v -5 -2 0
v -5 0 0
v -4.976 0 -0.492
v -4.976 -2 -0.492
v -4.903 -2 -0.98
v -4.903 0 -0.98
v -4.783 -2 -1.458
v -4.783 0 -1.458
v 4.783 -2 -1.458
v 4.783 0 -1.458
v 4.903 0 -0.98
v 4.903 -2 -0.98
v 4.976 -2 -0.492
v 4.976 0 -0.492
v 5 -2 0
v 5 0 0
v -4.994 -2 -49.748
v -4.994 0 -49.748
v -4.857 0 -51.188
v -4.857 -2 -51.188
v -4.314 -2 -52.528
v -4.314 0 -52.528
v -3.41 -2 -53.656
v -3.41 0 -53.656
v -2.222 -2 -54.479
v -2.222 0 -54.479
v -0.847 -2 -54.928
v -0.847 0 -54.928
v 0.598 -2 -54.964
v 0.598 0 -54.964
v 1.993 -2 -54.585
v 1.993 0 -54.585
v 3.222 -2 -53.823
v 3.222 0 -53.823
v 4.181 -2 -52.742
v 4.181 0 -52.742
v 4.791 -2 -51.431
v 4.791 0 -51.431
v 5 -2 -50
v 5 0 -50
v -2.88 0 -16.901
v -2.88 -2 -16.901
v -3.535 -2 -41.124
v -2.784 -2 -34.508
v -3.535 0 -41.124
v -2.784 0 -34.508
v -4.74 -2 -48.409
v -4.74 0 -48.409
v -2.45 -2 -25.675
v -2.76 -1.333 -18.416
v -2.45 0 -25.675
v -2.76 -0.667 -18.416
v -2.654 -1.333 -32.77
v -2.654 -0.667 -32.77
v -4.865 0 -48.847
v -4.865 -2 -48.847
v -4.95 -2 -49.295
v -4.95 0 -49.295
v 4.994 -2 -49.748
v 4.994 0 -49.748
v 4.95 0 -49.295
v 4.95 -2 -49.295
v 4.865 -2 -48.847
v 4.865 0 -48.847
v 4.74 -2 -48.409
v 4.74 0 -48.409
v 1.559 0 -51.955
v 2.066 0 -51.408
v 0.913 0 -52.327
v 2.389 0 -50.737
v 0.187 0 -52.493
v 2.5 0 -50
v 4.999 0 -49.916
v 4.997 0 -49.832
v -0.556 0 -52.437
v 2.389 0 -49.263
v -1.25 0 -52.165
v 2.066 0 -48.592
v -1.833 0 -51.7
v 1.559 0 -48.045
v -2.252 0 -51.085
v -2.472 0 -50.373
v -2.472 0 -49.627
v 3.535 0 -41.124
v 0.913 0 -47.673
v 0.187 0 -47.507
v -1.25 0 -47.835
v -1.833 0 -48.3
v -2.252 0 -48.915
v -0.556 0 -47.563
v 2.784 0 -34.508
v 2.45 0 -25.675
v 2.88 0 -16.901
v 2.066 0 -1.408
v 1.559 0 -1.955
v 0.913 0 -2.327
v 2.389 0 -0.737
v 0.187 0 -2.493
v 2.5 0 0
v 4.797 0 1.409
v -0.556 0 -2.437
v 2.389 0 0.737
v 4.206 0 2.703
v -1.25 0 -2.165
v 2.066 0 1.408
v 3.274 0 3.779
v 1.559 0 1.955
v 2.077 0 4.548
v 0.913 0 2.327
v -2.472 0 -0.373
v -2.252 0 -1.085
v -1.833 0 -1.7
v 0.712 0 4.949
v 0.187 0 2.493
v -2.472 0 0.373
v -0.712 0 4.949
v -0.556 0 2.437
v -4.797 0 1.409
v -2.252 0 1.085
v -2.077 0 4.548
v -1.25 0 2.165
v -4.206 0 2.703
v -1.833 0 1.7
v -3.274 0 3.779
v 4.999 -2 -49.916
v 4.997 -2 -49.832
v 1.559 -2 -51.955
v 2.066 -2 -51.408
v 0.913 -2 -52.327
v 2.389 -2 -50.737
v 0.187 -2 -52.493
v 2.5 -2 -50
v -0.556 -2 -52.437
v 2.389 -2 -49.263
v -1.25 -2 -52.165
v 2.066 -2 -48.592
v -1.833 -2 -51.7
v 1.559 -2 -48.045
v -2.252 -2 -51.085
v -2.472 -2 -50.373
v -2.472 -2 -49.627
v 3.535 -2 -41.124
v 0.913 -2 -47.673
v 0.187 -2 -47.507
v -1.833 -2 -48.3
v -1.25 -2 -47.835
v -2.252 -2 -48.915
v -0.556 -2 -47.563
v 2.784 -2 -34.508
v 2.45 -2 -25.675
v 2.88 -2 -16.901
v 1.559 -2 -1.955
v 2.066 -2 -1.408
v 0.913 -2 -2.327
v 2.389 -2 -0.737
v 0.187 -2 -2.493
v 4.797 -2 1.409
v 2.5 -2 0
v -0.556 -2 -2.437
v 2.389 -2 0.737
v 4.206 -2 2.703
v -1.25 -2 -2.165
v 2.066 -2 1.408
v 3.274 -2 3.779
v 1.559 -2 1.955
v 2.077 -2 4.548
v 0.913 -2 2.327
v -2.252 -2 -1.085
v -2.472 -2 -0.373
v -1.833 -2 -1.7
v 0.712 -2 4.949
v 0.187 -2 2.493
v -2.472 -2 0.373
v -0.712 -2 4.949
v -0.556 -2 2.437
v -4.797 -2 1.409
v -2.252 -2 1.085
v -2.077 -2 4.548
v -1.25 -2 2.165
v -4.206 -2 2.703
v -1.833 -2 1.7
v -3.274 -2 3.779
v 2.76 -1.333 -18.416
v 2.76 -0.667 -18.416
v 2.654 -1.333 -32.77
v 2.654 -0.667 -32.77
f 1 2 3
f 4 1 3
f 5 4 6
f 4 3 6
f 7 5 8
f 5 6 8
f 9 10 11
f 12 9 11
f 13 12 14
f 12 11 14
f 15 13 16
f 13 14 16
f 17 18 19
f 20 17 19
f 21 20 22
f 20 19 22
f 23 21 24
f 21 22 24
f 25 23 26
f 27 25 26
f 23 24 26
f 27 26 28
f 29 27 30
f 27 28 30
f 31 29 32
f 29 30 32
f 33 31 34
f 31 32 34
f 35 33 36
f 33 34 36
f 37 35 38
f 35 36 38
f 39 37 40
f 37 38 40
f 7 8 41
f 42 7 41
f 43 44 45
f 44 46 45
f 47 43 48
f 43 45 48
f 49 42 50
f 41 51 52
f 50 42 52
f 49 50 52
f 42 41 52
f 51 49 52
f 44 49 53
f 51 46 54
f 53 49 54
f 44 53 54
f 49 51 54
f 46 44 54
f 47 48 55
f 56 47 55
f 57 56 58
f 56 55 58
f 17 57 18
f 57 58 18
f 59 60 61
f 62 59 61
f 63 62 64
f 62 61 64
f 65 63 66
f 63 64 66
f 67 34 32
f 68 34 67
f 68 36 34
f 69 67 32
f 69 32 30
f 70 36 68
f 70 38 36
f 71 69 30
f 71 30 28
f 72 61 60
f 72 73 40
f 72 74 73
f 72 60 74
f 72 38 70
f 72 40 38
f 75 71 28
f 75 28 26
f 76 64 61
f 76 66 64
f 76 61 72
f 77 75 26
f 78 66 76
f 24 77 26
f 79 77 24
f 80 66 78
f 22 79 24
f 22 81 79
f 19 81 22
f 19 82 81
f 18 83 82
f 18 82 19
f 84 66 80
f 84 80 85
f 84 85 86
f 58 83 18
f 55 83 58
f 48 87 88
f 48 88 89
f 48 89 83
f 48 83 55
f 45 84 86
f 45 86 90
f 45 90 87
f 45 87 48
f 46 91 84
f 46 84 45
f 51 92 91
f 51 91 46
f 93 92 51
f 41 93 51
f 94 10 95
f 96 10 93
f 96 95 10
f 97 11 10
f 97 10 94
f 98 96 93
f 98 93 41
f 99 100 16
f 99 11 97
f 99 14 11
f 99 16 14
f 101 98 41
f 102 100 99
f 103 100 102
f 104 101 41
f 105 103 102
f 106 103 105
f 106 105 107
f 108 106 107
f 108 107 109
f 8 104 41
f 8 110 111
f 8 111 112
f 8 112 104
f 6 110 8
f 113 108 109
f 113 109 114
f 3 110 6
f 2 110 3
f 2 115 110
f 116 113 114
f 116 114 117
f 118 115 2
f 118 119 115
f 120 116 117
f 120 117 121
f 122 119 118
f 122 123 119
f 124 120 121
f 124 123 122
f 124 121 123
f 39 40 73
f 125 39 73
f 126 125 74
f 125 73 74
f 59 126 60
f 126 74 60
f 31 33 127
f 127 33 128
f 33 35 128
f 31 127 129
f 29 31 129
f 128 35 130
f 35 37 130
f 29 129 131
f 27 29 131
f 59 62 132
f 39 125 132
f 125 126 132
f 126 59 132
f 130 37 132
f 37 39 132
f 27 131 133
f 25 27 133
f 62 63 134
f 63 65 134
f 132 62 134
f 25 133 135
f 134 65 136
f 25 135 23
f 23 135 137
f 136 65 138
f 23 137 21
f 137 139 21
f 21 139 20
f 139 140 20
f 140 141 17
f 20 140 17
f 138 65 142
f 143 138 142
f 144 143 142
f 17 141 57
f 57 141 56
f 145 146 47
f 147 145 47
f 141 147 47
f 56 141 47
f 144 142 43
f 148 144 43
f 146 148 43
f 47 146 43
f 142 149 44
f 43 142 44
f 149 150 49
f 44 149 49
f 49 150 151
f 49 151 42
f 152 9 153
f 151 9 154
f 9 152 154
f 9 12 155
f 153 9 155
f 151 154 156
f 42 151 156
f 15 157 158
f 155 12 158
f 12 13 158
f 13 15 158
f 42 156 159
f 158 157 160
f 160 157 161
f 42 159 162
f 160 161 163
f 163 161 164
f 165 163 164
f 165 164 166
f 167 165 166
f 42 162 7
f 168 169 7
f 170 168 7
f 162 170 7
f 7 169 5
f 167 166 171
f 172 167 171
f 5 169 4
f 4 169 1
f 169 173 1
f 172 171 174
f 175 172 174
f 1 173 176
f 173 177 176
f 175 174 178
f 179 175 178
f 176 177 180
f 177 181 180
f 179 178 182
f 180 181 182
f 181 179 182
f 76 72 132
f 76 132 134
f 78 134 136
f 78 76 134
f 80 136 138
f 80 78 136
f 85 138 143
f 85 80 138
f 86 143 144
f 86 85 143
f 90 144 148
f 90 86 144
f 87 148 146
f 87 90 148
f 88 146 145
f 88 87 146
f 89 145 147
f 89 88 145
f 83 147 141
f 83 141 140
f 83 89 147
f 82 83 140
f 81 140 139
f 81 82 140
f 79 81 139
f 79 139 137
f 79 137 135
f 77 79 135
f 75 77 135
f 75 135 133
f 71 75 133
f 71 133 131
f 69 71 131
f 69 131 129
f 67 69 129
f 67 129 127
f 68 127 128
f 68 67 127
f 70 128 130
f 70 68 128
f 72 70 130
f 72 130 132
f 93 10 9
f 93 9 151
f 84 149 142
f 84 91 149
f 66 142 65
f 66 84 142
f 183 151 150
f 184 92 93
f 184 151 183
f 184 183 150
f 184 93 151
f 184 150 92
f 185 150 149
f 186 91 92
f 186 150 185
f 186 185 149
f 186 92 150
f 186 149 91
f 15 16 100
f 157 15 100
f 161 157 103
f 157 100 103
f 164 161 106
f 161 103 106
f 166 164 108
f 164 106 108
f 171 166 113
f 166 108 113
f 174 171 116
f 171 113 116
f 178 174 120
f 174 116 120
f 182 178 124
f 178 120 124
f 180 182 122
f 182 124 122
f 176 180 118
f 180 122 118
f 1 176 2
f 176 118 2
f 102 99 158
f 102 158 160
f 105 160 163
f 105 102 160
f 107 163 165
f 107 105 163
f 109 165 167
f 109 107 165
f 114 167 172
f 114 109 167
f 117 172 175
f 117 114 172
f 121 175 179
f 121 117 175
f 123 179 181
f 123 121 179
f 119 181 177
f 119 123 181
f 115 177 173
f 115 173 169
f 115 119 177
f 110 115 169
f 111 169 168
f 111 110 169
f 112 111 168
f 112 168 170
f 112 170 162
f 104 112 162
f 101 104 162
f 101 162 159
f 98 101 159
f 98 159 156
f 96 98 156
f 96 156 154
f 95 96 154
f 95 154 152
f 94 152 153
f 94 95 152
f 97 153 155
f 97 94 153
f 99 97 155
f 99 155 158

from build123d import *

# Parameters (mm, degrees)
F0_R     = 2.5
F1_DEPTH = 2


with BuildPart() as f1:
    # F0 (on Front) → F1 (new body)
    with BuildSketch(Plane.XZ):
        with BuildLine():
            add(Edge.make_bspline(
                [(5, 0), (4.926064, -0.492134), (4.853598, -0.978139), (4.782619, -1.458273)],
                knots=[0, 0, 0, 0, 1.163643, 1.163643, 1.163643, 1.163643], degree=3))
            ThreePointArc((5, 0), (0, 5), (-5, 0))
            add(Edge.make_bspline(
                [(-5, 0), (-4.926064, -0.492134), (-4.853598, -0.978139), (-4.782619, -1.458273)],
                knots=[0, 0, 0, 0, 1.163643, 1.163643, 1.163643, 1.163643], degree=3))
            ThreePointArc((-4.782619, -1.458273), (0, -5), (4.782619, -1.458273))
        make_face()
        Circle(F0_R, mode=Mode.SUBTRACT)
        with BuildLine():
            ThreePointArc((4.782619, -1.458273), (4.945356, -0.737193), (5, 0))
            add(Edge.make_bspline(
                [(5, 0), (4.926064, -0.492134), (4.853598, -0.978139), (4.782619, -1.458273)],
                knots=[0, 0, 0, 0, 1.163643, 1.163643, 1.163643, 1.163643], degree=3))
        make_face()
        with BuildLine():
            add(Edge.make_bspline(
                [(-5, 0), (-4.926064, -0.492134), (-4.853598, -0.978139), (-4.782619, -1.458273)],
                knots=[0, 0, 0, 0, 1.163643, 1.163643, 1.163643, 1.163643], degree=3))
            ThreePointArc((-5, 0), (-4.945356, -0.737193), (-4.782619, -1.458273))
        make_face()
        with BuildLine():
            add(Edge.make_bspline(
                [(4.782619, -1.458273), (1.891675, -21.013817), (1.467811, -30.83033), (4.740109, -48.408974)],
                knots=[1.163643, 1.163643, 1.163643, 1.163643, 48.558084, 48.558084, 48.558084, 48.558084], degree=3))
            ThreePointArc((4.782619, -1.458273), (0, -5), (-4.782619, -1.458273))
            add(Edge.make_bspline(
                [(-4.782619, -1.458273), (-1.891675, -21.013817), (-1.467811, -30.83033), (-4.740109, -48.408974)],
                knots=[1.163643, 1.163643, 1.163643, 1.163643, 48.558084, 48.558084, 48.558084, 48.558084], degree=3))
            ThreePointArc((-4.740109, -48.408974), (0, -45), (4.740109, -48.408974))
        make_face()
        with BuildLine():
            add(Edge.make_bspline(
                [(4.740109, -48.408974), (4.82229, -48.850442), (4.906801, -49.296806), (4.993663, -49.748342)],
                knots=[48.558084, 48.558084, 48.558084, 48.558084, 49.748343, 49.748343, 49.748343, 49.748343], degree=3))
            ThreePointArc((4.740109, -48.408974), (0, -45), (-4.740109, -48.408974))
            add(Edge.make_bspline(
                [(-4.740109, -48.408974), (-4.82229, -48.850442), (-4.906801, -49.296806), (-4.993663, -49.748342)],
                knots=[48.558084, 48.558084, 48.558084, 48.558084, 49.748343, 49.748343, 49.748343, 49.748343], degree=3))
            ThreePointArc((-4.993663, -49.748342), (-0.125869, -54.998415), (5, -50))
            ThreePointArc((5, -50), (4.998415, -49.874131), (4.993663, -49.748342))
        make_face()
        with Locations((0, -50)):
            Circle(F0_R, mode=Mode.SUBTRACT)
        with BuildLine():
            ThreePointArc((4.993663, -49.748342), (4.912744, -49.069977), (4.740109, -48.408974))
            add(Edge.make_bspline(
                [(4.740109, -48.408974), (4.82229, -48.850442), (4.906801, -49.296806), (4.993663, -49.748342)],
                knots=[48.558084, 48.558084, 48.558084, 48.558084, 49.748343, 49.748343, 49.748343, 49.748343], degree=3))
        make_face()
        with BuildLine():
            add(Edge.make_bspline(
                [(-4.740109, -48.408974), (-4.82229, -48.850442), (-4.906801, -49.296806), (-4.993663, -49.748342)],
                knots=[48.558084, 48.558084, 48.558084, 48.558084, 49.748343, 49.748343, 49.748343, 49.748343], degree=3))
            ThreePointArc((-4.740109, -48.408974), (-4.912744, -49.069977), (-4.993663, -49.748342))
        make_face()
    extrude(amount=F1_DEPTH)


solid = f1.part
